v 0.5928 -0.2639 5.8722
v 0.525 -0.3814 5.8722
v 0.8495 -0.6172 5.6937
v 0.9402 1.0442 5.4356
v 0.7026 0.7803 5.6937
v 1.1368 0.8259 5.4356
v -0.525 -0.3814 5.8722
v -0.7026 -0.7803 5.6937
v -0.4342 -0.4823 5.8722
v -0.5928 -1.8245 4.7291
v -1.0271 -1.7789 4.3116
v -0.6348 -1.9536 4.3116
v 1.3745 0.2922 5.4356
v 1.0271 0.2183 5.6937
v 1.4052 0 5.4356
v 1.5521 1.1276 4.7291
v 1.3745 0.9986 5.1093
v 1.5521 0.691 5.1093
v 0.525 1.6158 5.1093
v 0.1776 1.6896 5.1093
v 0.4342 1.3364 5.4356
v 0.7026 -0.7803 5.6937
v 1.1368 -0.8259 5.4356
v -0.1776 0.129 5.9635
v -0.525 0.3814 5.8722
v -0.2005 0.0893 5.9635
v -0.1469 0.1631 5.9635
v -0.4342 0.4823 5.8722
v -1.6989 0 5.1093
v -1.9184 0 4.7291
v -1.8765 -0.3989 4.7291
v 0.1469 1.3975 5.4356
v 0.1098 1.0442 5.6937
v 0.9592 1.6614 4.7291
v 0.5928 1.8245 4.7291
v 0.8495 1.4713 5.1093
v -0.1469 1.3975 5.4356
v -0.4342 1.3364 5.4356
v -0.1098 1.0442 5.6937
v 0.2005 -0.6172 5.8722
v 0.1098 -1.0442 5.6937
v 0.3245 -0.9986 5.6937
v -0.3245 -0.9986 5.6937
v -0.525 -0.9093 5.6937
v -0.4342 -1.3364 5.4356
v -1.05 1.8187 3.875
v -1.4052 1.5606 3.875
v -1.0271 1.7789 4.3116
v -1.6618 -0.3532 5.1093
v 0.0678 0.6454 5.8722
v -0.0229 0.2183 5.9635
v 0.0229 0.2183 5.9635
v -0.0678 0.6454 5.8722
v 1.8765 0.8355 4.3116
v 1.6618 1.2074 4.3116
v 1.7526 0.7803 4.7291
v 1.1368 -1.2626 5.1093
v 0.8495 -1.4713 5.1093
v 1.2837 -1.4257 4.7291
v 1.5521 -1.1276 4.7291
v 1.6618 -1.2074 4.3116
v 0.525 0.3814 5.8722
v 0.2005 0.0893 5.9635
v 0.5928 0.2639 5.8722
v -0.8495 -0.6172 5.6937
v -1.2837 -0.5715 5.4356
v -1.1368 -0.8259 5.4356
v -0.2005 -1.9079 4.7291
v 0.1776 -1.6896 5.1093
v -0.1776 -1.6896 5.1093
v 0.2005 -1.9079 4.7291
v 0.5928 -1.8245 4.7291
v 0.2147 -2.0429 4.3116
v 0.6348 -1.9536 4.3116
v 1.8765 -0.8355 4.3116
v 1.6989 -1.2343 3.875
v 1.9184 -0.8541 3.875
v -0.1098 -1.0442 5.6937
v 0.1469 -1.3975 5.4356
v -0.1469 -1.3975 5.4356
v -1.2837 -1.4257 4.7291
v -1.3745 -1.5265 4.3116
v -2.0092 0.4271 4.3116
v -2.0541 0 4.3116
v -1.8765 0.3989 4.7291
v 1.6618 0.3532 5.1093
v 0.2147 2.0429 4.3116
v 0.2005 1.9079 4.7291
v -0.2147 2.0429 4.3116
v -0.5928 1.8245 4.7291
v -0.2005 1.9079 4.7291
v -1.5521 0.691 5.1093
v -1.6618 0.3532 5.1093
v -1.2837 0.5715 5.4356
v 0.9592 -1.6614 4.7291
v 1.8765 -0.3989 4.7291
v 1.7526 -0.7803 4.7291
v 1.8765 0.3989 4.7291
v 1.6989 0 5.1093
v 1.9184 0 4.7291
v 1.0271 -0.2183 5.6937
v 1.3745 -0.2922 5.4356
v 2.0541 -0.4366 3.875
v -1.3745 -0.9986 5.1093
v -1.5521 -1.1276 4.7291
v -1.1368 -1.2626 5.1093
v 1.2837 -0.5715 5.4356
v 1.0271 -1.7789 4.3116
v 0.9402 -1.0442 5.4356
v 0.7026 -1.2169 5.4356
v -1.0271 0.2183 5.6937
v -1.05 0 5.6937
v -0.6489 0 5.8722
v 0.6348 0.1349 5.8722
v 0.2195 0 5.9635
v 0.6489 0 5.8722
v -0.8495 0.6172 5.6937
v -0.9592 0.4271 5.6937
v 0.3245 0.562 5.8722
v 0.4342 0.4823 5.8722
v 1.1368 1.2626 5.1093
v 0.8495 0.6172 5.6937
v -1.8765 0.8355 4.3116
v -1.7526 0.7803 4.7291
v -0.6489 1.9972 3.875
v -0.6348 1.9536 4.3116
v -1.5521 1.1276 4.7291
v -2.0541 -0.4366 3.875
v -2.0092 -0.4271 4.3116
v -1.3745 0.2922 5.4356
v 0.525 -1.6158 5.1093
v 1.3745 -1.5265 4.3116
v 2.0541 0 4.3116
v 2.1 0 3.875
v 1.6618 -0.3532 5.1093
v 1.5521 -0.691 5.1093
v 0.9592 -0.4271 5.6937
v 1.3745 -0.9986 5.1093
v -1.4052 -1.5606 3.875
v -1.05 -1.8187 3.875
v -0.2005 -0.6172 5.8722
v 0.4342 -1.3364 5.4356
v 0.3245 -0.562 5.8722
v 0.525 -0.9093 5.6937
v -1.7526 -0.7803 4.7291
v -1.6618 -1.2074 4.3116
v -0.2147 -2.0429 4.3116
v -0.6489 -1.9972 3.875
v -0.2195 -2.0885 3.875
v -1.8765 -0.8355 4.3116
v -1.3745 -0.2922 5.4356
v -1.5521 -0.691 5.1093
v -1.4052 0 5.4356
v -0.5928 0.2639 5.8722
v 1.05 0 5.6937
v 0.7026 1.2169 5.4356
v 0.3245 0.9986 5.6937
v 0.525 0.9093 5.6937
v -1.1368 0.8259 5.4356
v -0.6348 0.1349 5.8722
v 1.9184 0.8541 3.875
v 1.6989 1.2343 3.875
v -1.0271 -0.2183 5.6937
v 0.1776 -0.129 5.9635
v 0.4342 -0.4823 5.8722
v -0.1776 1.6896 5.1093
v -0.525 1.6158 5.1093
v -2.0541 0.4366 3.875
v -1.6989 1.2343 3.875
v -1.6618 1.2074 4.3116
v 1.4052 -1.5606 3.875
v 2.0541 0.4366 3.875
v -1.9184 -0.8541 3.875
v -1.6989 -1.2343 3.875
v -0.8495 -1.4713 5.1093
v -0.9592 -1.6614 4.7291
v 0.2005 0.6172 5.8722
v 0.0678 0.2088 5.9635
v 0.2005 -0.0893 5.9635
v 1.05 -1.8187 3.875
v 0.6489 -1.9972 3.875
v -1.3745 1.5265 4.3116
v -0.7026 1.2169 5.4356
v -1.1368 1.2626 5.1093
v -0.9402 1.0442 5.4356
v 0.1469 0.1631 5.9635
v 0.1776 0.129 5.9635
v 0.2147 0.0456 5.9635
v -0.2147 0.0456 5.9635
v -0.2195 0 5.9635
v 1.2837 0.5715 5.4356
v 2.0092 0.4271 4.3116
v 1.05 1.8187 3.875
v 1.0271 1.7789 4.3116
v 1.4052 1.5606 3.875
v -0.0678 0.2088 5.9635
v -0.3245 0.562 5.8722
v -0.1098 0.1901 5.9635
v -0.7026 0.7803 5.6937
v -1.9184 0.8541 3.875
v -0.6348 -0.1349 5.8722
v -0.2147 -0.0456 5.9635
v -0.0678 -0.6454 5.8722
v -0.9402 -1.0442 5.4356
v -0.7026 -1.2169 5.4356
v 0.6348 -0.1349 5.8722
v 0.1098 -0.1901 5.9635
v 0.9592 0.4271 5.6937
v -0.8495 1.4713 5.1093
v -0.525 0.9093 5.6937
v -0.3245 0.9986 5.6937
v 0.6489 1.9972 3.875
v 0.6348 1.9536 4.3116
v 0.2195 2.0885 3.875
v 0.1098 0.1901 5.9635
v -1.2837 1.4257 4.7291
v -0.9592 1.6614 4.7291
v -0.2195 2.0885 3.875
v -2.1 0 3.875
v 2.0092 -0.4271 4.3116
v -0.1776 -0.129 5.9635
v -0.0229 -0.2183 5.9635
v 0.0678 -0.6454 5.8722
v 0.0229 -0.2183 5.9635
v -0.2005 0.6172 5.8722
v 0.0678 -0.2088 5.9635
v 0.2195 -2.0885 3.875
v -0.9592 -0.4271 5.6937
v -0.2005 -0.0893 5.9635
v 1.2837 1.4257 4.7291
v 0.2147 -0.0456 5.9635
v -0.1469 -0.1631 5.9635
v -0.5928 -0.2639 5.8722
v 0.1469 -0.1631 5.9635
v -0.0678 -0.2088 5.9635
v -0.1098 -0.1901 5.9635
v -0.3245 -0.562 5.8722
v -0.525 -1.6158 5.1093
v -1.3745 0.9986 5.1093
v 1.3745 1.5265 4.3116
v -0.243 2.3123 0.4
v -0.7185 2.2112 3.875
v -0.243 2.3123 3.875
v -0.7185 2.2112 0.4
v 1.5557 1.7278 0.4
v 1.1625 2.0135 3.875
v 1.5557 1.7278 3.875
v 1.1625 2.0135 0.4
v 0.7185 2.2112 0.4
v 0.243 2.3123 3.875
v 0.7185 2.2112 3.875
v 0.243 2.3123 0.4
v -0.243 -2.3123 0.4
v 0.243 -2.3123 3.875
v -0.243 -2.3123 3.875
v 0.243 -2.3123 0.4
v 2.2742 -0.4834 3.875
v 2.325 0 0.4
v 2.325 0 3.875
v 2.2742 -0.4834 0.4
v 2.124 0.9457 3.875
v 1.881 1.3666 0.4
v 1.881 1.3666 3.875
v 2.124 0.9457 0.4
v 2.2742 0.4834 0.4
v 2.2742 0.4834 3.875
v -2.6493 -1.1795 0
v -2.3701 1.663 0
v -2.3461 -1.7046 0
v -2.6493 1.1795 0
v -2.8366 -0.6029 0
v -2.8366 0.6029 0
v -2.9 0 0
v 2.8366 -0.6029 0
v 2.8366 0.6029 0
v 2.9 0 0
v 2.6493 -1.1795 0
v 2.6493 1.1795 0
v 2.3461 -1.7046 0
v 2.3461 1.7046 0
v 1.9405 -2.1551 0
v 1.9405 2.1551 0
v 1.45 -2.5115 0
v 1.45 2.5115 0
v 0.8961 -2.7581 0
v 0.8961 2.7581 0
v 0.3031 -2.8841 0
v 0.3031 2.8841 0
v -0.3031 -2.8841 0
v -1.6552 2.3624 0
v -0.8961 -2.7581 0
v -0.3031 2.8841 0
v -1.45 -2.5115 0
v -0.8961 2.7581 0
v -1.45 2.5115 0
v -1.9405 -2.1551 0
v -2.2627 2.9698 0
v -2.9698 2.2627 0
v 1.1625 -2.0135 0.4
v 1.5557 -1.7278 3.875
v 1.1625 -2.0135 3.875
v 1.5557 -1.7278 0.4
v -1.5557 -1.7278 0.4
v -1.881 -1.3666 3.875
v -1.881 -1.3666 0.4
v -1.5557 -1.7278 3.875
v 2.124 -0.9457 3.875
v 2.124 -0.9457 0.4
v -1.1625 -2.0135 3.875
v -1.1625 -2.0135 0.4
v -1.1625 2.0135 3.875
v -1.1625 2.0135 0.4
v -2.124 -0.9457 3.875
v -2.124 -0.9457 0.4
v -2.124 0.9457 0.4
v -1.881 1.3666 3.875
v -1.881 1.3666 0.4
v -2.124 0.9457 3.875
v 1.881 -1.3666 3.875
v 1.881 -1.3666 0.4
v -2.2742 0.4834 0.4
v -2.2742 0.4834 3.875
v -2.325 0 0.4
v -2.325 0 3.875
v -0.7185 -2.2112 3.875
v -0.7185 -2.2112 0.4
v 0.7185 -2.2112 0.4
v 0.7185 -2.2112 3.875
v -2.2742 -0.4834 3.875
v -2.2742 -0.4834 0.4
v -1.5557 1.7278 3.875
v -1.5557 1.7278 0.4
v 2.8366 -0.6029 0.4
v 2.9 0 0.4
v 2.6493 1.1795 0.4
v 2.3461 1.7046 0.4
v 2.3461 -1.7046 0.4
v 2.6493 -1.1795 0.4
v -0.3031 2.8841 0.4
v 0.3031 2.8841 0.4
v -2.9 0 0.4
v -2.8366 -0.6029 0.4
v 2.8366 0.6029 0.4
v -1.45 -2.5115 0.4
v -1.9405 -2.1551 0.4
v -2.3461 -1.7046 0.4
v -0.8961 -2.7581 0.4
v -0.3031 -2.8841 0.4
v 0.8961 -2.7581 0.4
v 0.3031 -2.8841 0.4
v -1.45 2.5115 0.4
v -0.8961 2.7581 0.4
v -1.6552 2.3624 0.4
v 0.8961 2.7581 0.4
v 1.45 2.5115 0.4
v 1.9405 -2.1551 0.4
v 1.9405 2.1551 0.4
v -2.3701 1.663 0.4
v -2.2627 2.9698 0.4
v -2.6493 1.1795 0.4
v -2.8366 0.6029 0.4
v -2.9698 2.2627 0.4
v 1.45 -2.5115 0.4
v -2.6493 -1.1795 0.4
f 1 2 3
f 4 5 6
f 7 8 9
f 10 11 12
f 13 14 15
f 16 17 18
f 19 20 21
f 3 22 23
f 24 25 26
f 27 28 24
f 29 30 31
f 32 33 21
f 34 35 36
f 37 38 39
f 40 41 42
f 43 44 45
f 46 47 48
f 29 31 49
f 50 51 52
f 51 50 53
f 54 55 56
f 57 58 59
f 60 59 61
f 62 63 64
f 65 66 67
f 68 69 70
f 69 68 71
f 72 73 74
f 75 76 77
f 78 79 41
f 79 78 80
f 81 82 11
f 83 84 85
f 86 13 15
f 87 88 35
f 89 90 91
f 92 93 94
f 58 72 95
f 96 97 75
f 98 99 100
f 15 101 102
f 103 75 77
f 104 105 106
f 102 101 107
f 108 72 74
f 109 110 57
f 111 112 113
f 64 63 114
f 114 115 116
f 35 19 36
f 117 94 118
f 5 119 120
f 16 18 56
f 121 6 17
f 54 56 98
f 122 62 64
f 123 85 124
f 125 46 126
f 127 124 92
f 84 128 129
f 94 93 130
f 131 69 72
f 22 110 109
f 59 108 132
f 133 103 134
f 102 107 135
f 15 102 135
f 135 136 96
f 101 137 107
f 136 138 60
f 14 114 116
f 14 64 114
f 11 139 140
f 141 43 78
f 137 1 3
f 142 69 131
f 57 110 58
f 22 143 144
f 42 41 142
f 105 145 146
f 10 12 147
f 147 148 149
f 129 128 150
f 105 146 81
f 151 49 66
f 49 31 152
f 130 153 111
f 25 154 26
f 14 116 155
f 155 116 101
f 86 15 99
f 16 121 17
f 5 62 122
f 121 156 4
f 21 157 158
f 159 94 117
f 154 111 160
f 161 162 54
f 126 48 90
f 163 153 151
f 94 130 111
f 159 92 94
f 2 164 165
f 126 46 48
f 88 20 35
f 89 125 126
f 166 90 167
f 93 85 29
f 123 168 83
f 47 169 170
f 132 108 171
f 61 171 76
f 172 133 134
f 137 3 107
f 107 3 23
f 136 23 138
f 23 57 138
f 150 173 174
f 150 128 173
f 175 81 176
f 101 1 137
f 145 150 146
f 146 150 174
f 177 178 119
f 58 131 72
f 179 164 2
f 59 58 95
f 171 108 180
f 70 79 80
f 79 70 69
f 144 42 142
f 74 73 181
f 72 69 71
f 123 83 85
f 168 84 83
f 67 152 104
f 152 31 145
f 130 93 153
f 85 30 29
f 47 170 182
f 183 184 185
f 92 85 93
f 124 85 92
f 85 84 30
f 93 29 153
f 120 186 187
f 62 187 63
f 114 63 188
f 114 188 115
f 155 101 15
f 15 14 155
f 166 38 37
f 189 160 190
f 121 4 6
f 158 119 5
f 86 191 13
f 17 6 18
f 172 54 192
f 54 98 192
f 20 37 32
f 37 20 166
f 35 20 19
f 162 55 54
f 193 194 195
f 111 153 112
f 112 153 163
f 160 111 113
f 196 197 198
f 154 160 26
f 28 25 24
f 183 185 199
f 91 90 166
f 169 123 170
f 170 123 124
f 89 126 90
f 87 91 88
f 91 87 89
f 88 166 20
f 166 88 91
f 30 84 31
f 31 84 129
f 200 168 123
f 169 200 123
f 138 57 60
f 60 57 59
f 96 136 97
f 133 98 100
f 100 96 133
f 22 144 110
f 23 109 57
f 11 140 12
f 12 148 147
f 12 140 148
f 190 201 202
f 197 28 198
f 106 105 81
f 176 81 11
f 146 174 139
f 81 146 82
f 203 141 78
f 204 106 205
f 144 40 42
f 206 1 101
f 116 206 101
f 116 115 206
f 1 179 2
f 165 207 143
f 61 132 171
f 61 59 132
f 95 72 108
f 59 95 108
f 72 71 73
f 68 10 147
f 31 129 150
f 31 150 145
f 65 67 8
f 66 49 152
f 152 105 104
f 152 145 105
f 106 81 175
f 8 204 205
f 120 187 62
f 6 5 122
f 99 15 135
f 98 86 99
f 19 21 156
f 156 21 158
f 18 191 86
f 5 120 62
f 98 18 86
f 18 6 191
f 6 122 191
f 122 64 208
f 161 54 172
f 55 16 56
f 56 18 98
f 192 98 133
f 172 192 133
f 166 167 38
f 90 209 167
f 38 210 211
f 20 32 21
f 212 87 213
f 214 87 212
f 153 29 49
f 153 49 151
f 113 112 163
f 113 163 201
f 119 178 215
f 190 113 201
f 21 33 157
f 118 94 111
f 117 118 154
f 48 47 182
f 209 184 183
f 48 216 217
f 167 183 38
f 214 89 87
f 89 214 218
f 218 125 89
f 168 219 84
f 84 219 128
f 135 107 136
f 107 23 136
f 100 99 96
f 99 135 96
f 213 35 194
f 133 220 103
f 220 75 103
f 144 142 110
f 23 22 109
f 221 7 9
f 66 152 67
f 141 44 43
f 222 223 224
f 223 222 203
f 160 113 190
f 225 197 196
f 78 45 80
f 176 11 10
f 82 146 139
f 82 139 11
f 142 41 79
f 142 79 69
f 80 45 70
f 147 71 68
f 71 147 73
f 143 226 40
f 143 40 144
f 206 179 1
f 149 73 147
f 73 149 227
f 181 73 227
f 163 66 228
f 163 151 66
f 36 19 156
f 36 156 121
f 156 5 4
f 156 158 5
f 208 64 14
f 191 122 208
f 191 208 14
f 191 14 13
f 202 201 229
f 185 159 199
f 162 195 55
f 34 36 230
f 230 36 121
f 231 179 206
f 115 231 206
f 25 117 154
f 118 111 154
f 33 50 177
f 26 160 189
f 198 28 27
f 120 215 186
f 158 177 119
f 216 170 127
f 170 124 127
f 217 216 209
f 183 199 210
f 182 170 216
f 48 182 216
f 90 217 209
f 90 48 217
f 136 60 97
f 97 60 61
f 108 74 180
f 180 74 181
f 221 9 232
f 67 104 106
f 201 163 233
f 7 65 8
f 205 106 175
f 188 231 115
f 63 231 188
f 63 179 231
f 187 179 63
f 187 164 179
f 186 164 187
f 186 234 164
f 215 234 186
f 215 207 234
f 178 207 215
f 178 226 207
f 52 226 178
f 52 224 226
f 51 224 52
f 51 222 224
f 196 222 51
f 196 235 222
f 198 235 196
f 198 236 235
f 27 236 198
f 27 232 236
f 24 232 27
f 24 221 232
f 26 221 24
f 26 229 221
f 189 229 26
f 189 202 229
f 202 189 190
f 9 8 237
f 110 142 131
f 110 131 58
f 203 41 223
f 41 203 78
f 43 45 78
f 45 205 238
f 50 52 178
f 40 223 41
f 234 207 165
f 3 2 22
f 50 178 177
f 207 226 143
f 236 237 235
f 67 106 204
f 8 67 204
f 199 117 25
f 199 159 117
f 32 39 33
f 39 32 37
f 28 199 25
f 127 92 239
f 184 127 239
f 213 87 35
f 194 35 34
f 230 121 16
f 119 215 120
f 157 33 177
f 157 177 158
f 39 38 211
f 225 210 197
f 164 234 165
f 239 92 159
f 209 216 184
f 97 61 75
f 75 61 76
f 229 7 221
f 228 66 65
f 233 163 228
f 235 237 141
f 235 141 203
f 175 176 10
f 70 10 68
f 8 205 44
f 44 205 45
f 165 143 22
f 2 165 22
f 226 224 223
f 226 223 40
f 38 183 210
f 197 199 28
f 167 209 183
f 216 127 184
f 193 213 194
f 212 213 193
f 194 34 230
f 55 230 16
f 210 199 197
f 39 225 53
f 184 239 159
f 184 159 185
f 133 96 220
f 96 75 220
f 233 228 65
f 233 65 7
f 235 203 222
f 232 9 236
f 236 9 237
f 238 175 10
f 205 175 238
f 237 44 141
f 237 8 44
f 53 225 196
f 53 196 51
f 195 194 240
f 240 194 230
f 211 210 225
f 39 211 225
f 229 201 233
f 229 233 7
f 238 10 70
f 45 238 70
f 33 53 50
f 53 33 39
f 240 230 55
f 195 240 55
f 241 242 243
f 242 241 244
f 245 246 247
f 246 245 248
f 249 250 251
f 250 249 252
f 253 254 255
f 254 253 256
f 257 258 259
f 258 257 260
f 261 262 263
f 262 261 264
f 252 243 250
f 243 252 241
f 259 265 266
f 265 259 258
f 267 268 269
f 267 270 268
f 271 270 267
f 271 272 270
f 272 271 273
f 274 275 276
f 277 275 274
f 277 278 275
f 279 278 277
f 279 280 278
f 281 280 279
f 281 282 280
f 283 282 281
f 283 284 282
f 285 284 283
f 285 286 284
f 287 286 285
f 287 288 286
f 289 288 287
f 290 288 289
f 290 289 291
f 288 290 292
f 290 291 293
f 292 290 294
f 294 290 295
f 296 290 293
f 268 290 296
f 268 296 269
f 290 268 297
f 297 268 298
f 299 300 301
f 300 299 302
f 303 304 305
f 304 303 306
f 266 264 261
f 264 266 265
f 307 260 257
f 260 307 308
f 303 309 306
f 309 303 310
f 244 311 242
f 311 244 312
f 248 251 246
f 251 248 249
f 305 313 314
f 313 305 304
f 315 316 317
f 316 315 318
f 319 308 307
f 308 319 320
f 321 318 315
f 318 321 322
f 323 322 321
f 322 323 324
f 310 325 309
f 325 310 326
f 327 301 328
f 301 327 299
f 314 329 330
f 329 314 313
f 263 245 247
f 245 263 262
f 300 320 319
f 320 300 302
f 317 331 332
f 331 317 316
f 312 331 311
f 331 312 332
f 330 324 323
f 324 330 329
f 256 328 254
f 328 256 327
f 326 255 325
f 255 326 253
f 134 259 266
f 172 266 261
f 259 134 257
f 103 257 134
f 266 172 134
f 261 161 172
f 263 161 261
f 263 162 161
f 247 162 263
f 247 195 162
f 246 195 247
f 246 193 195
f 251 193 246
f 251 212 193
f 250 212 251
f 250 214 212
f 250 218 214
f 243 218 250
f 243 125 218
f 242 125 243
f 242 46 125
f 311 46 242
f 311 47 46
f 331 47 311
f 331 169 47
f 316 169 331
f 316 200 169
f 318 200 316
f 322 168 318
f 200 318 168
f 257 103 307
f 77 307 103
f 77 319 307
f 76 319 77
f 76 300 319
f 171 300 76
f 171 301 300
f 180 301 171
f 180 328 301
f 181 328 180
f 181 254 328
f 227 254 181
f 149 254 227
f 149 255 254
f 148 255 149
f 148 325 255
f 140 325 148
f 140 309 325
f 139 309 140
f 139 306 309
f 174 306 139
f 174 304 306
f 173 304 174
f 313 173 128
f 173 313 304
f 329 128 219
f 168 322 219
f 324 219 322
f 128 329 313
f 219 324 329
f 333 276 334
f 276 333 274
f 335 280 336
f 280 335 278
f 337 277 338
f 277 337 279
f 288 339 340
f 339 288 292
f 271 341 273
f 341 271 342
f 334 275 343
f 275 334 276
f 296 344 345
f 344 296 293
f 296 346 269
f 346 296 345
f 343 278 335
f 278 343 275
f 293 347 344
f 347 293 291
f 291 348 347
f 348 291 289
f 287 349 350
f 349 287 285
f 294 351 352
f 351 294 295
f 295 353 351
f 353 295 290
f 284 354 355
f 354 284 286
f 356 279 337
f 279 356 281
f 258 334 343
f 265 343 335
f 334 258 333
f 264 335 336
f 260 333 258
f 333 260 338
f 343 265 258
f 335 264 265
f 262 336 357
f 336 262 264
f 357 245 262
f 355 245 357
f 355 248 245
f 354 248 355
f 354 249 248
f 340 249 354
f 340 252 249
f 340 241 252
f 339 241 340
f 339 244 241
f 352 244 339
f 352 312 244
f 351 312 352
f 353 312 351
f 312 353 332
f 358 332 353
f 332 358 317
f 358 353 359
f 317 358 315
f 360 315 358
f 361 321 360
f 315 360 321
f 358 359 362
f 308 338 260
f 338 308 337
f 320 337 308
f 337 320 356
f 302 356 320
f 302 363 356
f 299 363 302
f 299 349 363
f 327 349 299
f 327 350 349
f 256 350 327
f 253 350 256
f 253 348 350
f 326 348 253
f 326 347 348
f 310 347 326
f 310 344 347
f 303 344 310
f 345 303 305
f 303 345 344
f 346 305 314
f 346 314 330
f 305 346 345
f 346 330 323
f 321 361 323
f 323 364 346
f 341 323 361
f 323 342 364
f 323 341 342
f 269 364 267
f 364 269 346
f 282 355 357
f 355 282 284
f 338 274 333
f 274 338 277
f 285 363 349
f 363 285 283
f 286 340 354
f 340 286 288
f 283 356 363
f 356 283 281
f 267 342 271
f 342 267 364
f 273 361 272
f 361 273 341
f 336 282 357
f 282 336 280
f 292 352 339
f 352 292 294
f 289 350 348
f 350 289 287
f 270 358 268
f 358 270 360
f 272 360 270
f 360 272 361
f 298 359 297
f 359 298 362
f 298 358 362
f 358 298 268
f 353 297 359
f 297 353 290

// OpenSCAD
module ST_1KL3A(){
  $fs=0.01;
    color("white") translate([0,0,6.2-4.65/2])sphere(4.2/2);
    color("gold") cylinder(h=6.2-4.65/2,r=4.65/2);
    color("gold") 
    cylinder(h=0.4, r=(5.8/2));
    rotate([0,0,90+45])translate([0,-0.5,0])cube([1+5.4/2, 1, 0.4]);
}

ST_1KL3A();
